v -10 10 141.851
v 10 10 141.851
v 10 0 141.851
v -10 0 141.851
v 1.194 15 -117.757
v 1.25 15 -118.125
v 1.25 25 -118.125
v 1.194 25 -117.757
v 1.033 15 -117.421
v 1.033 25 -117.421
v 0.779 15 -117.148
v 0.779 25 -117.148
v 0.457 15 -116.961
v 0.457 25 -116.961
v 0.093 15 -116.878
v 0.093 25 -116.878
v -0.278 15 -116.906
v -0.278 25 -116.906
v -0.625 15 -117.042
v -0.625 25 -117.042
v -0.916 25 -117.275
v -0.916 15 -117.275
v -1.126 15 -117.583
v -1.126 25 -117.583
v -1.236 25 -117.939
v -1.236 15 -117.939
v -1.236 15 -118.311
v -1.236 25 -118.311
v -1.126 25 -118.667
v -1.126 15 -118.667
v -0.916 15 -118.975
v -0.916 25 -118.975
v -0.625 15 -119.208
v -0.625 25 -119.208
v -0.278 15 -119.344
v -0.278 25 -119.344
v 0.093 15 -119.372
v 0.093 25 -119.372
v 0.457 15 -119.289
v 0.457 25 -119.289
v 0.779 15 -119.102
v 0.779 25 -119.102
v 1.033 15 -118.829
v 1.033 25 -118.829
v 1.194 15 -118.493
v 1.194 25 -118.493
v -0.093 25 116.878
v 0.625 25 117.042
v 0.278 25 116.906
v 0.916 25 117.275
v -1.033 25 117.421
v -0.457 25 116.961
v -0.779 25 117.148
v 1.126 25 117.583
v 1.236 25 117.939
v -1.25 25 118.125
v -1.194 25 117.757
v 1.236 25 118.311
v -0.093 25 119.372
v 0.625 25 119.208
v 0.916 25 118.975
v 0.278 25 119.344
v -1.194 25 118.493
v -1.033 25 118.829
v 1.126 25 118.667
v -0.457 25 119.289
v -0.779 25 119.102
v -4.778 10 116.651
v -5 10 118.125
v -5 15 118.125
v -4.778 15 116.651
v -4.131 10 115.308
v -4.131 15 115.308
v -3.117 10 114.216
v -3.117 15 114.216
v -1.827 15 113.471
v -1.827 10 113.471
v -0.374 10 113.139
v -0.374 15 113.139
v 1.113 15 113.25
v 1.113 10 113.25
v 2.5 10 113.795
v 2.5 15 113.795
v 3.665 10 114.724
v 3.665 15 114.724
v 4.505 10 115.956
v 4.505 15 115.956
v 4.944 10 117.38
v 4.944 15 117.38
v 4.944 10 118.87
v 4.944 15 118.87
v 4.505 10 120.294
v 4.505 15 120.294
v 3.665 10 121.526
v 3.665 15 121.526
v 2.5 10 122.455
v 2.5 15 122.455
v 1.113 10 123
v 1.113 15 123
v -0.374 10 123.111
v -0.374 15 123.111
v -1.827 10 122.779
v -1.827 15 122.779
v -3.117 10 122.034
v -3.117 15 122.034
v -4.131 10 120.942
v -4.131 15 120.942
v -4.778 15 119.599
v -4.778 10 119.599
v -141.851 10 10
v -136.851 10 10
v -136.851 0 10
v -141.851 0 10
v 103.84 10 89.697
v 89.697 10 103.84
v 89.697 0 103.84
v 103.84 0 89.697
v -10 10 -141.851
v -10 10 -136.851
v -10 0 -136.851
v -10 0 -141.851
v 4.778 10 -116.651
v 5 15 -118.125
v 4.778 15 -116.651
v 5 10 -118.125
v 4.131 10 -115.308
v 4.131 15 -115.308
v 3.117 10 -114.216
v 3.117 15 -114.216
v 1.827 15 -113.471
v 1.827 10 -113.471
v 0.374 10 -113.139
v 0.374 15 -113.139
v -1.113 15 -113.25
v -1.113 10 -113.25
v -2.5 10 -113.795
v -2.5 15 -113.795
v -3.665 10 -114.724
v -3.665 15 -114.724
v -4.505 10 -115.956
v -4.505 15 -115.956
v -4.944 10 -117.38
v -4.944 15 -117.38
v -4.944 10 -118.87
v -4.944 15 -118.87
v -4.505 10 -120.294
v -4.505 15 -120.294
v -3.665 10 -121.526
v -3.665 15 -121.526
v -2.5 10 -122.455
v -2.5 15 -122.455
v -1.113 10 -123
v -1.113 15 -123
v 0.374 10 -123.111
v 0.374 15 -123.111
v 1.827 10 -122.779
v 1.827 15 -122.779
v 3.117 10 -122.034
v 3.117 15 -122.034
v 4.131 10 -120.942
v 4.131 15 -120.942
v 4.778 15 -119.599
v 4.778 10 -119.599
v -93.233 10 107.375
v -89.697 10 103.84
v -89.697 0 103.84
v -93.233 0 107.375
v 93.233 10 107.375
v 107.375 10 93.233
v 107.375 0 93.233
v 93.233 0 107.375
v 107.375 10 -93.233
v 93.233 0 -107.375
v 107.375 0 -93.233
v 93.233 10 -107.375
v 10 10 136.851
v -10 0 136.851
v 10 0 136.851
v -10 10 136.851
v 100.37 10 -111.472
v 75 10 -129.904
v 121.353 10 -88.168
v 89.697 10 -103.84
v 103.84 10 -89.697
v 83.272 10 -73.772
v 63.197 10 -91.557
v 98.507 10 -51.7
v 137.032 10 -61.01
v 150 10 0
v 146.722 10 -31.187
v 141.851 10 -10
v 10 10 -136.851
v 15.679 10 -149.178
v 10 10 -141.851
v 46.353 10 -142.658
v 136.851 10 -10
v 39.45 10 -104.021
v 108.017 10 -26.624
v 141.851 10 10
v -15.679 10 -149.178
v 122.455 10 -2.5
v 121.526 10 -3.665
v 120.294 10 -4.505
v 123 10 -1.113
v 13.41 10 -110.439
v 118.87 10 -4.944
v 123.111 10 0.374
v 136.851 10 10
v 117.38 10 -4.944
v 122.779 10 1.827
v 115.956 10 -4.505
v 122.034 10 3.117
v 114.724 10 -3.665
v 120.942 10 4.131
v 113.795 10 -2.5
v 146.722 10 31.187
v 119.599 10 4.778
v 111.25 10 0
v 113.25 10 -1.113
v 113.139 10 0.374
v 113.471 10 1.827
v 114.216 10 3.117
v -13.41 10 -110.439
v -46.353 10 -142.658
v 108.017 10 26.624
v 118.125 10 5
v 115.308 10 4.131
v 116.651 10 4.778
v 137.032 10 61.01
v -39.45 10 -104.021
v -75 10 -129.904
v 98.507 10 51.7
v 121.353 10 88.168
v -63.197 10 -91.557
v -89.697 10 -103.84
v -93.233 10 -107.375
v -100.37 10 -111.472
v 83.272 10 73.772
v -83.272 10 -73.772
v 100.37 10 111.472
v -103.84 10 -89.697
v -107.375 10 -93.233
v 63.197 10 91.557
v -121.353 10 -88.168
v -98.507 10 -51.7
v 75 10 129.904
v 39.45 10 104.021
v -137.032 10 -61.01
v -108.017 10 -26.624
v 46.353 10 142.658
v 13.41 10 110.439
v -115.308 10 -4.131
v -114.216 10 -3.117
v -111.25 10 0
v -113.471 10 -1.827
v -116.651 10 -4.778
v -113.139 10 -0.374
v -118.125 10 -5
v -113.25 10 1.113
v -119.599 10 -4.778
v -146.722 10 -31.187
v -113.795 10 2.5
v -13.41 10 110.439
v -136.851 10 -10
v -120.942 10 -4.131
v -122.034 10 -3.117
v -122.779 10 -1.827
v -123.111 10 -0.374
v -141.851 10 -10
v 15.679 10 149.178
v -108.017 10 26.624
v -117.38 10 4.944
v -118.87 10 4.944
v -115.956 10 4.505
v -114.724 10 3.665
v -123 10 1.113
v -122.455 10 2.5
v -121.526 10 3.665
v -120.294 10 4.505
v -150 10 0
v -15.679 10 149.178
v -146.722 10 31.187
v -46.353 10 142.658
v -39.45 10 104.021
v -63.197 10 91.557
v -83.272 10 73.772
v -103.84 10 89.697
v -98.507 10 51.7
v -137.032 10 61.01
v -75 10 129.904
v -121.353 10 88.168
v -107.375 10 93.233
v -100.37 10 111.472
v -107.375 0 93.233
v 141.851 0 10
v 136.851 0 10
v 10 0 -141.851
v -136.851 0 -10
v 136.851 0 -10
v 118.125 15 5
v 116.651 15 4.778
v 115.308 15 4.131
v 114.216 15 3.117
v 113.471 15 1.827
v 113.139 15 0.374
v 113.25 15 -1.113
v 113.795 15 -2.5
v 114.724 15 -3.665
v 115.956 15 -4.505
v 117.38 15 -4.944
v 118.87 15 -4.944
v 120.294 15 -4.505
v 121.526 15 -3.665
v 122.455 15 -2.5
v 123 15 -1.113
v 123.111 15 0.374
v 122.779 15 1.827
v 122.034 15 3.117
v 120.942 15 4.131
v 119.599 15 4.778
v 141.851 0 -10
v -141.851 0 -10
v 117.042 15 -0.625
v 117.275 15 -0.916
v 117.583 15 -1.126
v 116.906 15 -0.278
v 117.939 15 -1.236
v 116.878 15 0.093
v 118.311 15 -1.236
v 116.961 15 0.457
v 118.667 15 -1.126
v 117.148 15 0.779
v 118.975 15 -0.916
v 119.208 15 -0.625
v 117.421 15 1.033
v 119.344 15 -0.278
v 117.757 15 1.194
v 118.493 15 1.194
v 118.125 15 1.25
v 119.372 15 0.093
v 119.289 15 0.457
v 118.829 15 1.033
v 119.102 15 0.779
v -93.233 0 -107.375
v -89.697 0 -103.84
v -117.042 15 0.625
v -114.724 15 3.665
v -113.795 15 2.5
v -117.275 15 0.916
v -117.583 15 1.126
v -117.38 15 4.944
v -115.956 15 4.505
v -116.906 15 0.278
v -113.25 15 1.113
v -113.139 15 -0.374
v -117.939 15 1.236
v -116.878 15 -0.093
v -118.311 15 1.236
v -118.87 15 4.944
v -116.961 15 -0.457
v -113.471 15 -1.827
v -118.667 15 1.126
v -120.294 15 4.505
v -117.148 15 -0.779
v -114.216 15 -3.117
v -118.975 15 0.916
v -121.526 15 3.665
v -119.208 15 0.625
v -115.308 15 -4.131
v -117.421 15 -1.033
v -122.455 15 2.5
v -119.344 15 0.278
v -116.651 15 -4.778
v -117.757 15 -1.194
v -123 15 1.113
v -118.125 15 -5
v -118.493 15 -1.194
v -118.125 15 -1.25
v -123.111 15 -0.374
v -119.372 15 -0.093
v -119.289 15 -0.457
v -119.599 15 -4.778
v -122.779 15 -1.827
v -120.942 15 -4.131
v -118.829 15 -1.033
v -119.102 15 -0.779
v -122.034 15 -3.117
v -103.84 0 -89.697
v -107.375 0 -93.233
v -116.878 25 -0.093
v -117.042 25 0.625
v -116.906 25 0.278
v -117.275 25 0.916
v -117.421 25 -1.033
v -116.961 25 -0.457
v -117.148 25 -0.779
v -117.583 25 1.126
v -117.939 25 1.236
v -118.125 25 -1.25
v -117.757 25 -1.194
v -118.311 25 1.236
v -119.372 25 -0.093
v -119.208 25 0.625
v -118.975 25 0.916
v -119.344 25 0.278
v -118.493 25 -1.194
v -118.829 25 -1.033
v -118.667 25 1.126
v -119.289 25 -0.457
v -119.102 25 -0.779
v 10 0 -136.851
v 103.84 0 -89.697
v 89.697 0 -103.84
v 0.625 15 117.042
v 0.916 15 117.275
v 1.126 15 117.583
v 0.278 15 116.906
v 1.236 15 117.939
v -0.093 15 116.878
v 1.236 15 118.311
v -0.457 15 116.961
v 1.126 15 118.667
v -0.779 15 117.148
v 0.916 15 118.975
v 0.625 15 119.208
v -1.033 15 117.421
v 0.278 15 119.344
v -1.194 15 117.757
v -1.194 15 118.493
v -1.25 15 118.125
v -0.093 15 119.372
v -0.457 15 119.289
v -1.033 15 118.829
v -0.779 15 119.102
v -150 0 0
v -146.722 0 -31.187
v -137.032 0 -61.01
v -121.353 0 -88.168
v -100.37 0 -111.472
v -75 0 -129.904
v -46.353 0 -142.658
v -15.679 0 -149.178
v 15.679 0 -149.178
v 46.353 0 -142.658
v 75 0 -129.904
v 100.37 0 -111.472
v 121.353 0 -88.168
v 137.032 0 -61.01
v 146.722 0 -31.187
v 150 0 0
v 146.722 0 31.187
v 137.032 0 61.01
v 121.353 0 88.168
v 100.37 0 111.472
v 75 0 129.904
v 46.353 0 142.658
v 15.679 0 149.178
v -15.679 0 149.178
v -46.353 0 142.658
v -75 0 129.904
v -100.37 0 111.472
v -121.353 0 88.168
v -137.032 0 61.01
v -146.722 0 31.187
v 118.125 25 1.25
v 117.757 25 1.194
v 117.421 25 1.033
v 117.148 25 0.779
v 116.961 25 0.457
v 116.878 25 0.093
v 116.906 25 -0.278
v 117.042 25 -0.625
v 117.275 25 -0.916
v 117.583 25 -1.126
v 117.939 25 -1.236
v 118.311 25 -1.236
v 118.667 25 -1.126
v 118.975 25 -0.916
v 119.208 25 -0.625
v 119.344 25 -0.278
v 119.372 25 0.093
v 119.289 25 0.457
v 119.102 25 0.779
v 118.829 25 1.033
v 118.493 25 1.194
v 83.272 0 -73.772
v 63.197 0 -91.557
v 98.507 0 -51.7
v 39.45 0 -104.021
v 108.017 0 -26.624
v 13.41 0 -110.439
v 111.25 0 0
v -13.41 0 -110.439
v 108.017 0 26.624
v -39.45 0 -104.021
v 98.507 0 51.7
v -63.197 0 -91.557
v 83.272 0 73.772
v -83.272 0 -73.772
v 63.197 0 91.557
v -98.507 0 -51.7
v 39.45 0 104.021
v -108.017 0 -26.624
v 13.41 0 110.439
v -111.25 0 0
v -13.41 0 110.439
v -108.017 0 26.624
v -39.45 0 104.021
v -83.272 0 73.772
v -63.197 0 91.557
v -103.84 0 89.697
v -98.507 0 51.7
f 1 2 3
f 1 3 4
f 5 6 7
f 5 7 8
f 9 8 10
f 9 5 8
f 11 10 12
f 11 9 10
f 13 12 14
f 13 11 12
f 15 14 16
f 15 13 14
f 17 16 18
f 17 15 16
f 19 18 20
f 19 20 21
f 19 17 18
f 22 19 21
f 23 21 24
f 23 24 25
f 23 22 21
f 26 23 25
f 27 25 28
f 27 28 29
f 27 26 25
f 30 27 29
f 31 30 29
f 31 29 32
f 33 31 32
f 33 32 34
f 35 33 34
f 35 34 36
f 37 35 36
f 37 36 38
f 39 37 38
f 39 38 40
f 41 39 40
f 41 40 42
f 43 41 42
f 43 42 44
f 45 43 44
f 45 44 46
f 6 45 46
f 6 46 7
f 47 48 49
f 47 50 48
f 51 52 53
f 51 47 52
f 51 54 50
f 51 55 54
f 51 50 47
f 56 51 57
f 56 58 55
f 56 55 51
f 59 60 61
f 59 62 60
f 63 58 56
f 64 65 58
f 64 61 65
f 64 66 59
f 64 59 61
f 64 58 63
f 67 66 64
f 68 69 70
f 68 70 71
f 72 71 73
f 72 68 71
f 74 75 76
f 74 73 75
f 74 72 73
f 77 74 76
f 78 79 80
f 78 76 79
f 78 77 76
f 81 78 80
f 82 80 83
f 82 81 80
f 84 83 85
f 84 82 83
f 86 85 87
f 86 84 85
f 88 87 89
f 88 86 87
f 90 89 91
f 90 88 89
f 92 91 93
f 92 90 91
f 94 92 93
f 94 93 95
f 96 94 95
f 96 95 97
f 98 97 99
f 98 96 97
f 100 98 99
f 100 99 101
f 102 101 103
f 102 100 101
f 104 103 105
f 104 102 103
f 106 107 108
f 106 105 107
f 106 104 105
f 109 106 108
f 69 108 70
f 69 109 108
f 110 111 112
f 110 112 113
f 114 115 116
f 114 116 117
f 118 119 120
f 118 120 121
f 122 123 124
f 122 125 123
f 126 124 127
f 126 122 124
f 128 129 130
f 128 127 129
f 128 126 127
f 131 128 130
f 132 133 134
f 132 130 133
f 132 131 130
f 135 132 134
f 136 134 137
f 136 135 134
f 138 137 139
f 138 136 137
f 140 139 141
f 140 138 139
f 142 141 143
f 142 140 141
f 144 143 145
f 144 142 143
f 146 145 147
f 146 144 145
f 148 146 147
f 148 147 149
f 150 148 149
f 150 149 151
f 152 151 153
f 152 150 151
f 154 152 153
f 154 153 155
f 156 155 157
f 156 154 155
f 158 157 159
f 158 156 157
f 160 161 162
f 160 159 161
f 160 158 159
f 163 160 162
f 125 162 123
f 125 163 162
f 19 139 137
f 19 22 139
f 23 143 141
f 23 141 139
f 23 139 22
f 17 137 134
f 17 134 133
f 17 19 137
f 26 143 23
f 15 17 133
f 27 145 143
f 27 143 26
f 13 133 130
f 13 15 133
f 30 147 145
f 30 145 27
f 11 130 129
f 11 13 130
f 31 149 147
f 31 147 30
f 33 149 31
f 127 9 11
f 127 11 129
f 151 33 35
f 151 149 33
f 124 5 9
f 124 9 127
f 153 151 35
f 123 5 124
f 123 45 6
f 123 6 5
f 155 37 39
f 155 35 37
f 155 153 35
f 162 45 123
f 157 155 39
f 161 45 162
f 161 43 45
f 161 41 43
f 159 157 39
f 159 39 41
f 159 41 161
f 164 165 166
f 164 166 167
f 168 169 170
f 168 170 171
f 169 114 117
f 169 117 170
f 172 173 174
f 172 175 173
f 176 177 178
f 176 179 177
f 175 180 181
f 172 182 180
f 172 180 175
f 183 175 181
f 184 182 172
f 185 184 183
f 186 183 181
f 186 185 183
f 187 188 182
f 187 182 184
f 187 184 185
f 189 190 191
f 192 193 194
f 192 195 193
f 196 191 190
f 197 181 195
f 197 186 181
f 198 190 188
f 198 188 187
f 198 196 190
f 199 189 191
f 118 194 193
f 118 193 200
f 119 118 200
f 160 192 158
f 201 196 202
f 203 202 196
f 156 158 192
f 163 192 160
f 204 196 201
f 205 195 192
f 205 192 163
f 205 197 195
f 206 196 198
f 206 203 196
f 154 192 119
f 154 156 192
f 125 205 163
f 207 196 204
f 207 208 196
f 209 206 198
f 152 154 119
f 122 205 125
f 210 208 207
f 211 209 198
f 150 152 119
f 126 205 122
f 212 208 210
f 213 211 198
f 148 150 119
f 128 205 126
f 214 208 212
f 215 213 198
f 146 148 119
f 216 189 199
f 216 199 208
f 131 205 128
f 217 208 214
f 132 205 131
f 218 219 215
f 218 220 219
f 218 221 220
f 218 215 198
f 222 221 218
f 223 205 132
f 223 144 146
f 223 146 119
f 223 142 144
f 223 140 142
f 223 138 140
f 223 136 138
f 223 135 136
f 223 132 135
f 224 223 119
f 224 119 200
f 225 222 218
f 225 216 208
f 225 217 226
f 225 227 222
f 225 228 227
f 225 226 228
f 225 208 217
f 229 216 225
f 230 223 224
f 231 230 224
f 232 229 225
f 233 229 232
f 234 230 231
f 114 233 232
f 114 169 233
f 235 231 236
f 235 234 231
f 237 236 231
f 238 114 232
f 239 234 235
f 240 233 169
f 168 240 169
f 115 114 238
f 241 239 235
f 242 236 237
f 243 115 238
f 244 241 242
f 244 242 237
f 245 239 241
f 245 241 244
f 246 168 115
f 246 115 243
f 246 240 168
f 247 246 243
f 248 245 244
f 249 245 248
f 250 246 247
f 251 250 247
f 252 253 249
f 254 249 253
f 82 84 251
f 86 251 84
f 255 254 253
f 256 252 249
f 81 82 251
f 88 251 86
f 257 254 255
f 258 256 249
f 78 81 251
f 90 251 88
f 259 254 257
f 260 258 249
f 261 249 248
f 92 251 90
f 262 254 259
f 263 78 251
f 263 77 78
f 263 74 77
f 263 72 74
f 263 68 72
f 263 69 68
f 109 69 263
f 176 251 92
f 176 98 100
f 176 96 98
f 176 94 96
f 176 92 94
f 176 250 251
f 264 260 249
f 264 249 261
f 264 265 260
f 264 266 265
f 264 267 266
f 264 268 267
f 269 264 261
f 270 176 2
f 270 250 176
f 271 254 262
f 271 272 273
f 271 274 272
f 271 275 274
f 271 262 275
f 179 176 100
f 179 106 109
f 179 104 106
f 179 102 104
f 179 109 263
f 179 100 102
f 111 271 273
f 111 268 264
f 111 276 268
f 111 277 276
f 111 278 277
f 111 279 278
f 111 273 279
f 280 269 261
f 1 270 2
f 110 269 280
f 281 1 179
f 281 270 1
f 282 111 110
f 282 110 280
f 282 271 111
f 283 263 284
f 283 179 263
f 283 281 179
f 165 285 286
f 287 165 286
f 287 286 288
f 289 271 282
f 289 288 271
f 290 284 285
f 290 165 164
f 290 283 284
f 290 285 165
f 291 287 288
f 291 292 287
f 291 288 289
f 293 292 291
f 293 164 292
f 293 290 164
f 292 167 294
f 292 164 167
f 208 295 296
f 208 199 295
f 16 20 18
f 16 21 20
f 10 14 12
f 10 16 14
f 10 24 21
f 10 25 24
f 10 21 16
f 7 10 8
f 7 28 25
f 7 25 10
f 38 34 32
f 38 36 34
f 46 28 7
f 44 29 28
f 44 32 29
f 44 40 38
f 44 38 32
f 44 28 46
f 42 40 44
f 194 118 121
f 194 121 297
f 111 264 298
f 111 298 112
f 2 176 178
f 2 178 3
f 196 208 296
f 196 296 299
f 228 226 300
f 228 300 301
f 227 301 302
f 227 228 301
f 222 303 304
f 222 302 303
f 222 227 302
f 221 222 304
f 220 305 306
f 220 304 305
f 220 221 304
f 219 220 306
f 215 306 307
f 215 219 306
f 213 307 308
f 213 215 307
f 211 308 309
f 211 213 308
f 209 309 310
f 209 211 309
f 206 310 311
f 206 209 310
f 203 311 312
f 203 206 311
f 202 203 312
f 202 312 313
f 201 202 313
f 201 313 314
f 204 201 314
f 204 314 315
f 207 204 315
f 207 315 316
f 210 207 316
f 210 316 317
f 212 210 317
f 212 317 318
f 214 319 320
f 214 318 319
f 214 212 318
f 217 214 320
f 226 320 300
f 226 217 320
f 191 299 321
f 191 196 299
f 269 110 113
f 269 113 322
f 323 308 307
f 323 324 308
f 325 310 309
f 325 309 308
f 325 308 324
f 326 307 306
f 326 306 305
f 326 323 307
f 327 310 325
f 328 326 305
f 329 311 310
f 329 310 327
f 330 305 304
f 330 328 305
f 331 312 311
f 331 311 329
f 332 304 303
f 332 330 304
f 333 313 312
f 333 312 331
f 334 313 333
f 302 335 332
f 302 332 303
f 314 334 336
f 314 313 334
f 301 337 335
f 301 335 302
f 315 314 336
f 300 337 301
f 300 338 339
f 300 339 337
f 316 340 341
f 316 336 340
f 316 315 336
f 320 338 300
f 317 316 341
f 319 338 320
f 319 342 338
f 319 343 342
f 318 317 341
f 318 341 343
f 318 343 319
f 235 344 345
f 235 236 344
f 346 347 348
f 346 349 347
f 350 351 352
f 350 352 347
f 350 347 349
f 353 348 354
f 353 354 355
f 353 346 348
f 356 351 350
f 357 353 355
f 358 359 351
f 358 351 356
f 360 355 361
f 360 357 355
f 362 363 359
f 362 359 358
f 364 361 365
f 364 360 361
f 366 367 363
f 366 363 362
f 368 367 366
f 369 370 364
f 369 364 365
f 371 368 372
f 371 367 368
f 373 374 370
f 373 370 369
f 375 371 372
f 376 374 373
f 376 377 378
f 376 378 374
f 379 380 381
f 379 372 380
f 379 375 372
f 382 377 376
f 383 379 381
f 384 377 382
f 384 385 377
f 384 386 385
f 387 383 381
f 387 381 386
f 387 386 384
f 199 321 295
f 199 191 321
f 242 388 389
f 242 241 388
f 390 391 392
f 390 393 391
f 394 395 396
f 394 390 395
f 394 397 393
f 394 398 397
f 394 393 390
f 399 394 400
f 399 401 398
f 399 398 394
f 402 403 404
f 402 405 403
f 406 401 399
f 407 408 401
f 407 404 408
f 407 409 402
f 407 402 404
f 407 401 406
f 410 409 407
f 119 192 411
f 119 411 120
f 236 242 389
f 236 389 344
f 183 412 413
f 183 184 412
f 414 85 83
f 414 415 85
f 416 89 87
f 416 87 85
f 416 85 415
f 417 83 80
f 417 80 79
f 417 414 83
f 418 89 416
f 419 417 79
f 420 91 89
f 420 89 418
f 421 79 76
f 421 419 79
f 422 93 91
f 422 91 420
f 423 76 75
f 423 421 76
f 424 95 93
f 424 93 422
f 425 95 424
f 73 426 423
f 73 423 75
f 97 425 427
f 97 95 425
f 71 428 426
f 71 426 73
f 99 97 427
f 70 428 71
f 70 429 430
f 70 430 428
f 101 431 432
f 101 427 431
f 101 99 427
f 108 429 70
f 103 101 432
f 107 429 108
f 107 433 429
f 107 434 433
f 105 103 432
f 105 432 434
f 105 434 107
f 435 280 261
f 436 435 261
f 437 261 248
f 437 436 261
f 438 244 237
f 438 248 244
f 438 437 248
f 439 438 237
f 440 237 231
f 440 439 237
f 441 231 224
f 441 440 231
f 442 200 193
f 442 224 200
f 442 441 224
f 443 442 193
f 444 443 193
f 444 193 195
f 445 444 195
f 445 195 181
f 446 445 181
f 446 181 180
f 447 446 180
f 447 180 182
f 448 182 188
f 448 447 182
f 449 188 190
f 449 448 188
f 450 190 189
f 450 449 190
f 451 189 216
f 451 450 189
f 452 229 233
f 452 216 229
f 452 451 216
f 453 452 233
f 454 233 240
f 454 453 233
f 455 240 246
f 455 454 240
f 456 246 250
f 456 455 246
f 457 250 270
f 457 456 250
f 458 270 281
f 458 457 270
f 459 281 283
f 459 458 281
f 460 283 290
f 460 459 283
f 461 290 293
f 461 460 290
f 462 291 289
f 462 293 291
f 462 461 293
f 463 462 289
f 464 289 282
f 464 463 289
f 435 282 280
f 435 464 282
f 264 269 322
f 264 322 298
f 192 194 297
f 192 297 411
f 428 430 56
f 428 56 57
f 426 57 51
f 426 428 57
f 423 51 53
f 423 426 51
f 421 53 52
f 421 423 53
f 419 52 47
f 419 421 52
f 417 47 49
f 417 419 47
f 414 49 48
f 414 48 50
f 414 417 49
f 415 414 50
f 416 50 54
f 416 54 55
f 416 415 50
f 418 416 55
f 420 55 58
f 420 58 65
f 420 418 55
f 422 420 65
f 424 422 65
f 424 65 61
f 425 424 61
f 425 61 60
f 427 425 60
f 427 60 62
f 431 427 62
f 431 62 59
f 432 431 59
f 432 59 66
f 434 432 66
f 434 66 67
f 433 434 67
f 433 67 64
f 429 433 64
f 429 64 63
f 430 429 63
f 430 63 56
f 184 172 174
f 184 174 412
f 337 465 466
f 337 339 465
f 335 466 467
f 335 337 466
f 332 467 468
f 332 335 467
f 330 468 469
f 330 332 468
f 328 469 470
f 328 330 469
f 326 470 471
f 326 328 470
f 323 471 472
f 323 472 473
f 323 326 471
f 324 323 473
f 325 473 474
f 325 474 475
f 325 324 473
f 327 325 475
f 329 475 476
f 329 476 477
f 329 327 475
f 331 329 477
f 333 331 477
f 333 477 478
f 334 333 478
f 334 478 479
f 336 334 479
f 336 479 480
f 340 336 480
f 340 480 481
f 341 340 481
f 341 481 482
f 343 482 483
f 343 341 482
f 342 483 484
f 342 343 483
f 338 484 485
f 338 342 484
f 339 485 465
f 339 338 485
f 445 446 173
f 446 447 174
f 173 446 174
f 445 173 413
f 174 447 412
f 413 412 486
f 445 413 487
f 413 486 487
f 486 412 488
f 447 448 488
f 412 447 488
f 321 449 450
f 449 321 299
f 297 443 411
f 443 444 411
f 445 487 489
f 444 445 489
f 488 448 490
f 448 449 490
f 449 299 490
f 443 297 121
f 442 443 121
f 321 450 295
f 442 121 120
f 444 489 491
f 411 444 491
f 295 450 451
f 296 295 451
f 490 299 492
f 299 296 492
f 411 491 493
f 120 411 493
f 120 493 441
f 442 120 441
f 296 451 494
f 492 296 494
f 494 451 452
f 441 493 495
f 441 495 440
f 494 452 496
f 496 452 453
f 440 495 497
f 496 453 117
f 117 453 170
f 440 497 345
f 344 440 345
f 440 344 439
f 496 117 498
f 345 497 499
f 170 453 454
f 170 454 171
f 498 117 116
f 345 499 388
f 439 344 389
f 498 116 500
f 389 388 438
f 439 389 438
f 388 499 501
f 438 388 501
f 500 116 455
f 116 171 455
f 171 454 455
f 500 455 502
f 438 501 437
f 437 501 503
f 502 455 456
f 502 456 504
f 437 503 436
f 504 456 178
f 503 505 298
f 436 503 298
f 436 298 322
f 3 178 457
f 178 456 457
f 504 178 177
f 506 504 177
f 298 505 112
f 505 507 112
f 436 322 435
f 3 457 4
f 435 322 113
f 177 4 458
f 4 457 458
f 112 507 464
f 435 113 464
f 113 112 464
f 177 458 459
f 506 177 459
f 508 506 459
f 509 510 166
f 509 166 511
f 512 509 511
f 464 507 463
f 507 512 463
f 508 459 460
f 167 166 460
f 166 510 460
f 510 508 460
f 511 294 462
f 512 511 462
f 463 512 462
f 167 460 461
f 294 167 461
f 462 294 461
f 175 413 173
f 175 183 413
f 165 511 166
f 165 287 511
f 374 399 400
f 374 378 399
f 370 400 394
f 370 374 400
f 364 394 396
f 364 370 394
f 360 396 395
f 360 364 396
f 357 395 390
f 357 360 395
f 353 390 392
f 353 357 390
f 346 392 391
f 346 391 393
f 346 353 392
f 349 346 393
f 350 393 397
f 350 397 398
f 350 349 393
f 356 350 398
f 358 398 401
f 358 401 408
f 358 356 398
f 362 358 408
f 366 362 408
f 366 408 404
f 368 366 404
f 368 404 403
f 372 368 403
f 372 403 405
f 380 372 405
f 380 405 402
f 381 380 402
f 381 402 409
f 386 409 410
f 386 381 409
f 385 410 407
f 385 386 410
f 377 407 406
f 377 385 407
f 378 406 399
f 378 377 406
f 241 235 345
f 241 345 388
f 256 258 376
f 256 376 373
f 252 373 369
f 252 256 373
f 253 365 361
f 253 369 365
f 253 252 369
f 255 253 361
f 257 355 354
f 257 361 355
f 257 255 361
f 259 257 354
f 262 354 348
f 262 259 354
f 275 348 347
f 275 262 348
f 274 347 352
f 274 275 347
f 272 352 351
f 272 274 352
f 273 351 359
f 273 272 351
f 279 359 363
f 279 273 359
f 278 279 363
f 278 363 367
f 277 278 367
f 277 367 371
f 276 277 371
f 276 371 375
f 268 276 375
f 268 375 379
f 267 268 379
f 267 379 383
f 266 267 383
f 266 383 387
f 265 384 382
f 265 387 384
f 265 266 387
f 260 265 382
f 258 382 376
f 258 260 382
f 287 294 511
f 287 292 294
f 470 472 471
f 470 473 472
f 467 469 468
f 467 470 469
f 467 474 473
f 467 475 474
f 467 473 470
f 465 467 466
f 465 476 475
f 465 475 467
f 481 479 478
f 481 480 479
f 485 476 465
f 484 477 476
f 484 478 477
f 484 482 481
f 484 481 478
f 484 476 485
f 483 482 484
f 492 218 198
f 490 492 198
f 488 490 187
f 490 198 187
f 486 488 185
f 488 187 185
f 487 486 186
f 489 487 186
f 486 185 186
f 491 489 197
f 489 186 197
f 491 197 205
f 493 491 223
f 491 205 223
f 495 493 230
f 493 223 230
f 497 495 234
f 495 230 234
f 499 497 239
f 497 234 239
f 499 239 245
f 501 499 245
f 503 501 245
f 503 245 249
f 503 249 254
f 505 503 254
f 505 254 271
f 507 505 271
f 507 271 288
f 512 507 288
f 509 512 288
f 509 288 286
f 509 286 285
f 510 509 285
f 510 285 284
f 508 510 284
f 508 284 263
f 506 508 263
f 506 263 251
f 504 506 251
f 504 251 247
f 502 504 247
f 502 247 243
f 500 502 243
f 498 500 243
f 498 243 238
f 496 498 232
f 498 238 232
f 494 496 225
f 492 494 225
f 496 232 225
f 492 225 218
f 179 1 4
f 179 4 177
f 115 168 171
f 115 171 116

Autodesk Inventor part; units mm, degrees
ref_plane "YZ Plane" through (0, 0, 0) normal (1, 0, 0) x (0, 1, 0)
ref_plane "XZ Plane" through (0, 0, 0) normal (0, 1, 0) x (-1, 0, 0)
ref_plane "XY Plane" through (0, 0, 0) normal (0, 0, 1) x (1, 0, 0)
sketch "Sketch2" plane through (0, 0, 0) normal (0, 1, 0) x (-1, 0, 0)
  circle A0 centre (0, 0) radius 150
  dimension "d1" = 300
extrude "Extrusion1" add sketch "Sketch2" along normal blind 10
sketch "Sketch3" plane through (0, 10, 0) normal (0, 1, 0) x (1, 0, 0)
  circle A0 centre (0, 0) radius 111.25
  dimension "d4" = 222.5
sketch "Sketch4" plane through (0, 10, 0) normal (0, 1, 0) x (1, 0, 0)
  circle A0 centre (0, 0) radius 118.125
  circle A1 centre (0, 118.125) radius 1.25
  dimension "d5" = 236.25
  dimension "d6" = 2.5
extrude "Extrusion2" add sketch "Sketch4" along normal blind 15 contours A1 A0 | A0 A1 picked at (0.0501, 117.7109) picked at (0.0492, 118.5383)
sketch "Sketch5" plane through (0, 10, 0) normal (0, 1, 0) x (1, 0, 0)
  circle A0 centre (0, 118.125) radius 1.25 projected
  circle A1 centre (0, 118.125) radius 5
  point P0 (0, 0)
  dimension "d9" = 10
extrude "Extrusion3" add sketch "Sketch5" along normal blind 5
extrude "Extrusion4" cut sketch "Sketch3" against normal blind 10
pattern_circular "Circular Pattern1" count 4 over 360 about axis through (0, -10, 0) along (0, 1, 0) of "Extrusion3", "Extrusion2"
sketch "Sketch6" plane through (0, 10, 0) normal (0, 1, 0) x (1, 0, 0)
  line L0 (0, -139.3513) -> (10, -139.3513)
  line L1 (0, -139.3513) -> (10, -139.3513) construction
  line L2 (10, -139.3513) -> (10, -141.8513)
  line L3 (10, -141.8513) -> (-10, -141.8513)
  line L4 (-10, -141.8513) -> (-10, -136.8513)
  line L5 (-10, -136.8513) -> (10, -136.8513)
  line L6 (10, -136.8513) -> (10, -141.8513)
  point P0 (0, 0)
  dimension "d17" = 10
  dimension "d18" = 0
  dimension "d19" = 2.5
  dimension "d20" = 20
  dimension "d21" = 5
extrude "Extrusion5" cut sketch "Sketch6" against normal up to surface (10 mm away)
pattern_circular "Circular Pattern2" count 8 over 360 about axis through (0, -10, 0) along (0, 1, 0) of "Extrusion5"
properties part number "TableCover"
